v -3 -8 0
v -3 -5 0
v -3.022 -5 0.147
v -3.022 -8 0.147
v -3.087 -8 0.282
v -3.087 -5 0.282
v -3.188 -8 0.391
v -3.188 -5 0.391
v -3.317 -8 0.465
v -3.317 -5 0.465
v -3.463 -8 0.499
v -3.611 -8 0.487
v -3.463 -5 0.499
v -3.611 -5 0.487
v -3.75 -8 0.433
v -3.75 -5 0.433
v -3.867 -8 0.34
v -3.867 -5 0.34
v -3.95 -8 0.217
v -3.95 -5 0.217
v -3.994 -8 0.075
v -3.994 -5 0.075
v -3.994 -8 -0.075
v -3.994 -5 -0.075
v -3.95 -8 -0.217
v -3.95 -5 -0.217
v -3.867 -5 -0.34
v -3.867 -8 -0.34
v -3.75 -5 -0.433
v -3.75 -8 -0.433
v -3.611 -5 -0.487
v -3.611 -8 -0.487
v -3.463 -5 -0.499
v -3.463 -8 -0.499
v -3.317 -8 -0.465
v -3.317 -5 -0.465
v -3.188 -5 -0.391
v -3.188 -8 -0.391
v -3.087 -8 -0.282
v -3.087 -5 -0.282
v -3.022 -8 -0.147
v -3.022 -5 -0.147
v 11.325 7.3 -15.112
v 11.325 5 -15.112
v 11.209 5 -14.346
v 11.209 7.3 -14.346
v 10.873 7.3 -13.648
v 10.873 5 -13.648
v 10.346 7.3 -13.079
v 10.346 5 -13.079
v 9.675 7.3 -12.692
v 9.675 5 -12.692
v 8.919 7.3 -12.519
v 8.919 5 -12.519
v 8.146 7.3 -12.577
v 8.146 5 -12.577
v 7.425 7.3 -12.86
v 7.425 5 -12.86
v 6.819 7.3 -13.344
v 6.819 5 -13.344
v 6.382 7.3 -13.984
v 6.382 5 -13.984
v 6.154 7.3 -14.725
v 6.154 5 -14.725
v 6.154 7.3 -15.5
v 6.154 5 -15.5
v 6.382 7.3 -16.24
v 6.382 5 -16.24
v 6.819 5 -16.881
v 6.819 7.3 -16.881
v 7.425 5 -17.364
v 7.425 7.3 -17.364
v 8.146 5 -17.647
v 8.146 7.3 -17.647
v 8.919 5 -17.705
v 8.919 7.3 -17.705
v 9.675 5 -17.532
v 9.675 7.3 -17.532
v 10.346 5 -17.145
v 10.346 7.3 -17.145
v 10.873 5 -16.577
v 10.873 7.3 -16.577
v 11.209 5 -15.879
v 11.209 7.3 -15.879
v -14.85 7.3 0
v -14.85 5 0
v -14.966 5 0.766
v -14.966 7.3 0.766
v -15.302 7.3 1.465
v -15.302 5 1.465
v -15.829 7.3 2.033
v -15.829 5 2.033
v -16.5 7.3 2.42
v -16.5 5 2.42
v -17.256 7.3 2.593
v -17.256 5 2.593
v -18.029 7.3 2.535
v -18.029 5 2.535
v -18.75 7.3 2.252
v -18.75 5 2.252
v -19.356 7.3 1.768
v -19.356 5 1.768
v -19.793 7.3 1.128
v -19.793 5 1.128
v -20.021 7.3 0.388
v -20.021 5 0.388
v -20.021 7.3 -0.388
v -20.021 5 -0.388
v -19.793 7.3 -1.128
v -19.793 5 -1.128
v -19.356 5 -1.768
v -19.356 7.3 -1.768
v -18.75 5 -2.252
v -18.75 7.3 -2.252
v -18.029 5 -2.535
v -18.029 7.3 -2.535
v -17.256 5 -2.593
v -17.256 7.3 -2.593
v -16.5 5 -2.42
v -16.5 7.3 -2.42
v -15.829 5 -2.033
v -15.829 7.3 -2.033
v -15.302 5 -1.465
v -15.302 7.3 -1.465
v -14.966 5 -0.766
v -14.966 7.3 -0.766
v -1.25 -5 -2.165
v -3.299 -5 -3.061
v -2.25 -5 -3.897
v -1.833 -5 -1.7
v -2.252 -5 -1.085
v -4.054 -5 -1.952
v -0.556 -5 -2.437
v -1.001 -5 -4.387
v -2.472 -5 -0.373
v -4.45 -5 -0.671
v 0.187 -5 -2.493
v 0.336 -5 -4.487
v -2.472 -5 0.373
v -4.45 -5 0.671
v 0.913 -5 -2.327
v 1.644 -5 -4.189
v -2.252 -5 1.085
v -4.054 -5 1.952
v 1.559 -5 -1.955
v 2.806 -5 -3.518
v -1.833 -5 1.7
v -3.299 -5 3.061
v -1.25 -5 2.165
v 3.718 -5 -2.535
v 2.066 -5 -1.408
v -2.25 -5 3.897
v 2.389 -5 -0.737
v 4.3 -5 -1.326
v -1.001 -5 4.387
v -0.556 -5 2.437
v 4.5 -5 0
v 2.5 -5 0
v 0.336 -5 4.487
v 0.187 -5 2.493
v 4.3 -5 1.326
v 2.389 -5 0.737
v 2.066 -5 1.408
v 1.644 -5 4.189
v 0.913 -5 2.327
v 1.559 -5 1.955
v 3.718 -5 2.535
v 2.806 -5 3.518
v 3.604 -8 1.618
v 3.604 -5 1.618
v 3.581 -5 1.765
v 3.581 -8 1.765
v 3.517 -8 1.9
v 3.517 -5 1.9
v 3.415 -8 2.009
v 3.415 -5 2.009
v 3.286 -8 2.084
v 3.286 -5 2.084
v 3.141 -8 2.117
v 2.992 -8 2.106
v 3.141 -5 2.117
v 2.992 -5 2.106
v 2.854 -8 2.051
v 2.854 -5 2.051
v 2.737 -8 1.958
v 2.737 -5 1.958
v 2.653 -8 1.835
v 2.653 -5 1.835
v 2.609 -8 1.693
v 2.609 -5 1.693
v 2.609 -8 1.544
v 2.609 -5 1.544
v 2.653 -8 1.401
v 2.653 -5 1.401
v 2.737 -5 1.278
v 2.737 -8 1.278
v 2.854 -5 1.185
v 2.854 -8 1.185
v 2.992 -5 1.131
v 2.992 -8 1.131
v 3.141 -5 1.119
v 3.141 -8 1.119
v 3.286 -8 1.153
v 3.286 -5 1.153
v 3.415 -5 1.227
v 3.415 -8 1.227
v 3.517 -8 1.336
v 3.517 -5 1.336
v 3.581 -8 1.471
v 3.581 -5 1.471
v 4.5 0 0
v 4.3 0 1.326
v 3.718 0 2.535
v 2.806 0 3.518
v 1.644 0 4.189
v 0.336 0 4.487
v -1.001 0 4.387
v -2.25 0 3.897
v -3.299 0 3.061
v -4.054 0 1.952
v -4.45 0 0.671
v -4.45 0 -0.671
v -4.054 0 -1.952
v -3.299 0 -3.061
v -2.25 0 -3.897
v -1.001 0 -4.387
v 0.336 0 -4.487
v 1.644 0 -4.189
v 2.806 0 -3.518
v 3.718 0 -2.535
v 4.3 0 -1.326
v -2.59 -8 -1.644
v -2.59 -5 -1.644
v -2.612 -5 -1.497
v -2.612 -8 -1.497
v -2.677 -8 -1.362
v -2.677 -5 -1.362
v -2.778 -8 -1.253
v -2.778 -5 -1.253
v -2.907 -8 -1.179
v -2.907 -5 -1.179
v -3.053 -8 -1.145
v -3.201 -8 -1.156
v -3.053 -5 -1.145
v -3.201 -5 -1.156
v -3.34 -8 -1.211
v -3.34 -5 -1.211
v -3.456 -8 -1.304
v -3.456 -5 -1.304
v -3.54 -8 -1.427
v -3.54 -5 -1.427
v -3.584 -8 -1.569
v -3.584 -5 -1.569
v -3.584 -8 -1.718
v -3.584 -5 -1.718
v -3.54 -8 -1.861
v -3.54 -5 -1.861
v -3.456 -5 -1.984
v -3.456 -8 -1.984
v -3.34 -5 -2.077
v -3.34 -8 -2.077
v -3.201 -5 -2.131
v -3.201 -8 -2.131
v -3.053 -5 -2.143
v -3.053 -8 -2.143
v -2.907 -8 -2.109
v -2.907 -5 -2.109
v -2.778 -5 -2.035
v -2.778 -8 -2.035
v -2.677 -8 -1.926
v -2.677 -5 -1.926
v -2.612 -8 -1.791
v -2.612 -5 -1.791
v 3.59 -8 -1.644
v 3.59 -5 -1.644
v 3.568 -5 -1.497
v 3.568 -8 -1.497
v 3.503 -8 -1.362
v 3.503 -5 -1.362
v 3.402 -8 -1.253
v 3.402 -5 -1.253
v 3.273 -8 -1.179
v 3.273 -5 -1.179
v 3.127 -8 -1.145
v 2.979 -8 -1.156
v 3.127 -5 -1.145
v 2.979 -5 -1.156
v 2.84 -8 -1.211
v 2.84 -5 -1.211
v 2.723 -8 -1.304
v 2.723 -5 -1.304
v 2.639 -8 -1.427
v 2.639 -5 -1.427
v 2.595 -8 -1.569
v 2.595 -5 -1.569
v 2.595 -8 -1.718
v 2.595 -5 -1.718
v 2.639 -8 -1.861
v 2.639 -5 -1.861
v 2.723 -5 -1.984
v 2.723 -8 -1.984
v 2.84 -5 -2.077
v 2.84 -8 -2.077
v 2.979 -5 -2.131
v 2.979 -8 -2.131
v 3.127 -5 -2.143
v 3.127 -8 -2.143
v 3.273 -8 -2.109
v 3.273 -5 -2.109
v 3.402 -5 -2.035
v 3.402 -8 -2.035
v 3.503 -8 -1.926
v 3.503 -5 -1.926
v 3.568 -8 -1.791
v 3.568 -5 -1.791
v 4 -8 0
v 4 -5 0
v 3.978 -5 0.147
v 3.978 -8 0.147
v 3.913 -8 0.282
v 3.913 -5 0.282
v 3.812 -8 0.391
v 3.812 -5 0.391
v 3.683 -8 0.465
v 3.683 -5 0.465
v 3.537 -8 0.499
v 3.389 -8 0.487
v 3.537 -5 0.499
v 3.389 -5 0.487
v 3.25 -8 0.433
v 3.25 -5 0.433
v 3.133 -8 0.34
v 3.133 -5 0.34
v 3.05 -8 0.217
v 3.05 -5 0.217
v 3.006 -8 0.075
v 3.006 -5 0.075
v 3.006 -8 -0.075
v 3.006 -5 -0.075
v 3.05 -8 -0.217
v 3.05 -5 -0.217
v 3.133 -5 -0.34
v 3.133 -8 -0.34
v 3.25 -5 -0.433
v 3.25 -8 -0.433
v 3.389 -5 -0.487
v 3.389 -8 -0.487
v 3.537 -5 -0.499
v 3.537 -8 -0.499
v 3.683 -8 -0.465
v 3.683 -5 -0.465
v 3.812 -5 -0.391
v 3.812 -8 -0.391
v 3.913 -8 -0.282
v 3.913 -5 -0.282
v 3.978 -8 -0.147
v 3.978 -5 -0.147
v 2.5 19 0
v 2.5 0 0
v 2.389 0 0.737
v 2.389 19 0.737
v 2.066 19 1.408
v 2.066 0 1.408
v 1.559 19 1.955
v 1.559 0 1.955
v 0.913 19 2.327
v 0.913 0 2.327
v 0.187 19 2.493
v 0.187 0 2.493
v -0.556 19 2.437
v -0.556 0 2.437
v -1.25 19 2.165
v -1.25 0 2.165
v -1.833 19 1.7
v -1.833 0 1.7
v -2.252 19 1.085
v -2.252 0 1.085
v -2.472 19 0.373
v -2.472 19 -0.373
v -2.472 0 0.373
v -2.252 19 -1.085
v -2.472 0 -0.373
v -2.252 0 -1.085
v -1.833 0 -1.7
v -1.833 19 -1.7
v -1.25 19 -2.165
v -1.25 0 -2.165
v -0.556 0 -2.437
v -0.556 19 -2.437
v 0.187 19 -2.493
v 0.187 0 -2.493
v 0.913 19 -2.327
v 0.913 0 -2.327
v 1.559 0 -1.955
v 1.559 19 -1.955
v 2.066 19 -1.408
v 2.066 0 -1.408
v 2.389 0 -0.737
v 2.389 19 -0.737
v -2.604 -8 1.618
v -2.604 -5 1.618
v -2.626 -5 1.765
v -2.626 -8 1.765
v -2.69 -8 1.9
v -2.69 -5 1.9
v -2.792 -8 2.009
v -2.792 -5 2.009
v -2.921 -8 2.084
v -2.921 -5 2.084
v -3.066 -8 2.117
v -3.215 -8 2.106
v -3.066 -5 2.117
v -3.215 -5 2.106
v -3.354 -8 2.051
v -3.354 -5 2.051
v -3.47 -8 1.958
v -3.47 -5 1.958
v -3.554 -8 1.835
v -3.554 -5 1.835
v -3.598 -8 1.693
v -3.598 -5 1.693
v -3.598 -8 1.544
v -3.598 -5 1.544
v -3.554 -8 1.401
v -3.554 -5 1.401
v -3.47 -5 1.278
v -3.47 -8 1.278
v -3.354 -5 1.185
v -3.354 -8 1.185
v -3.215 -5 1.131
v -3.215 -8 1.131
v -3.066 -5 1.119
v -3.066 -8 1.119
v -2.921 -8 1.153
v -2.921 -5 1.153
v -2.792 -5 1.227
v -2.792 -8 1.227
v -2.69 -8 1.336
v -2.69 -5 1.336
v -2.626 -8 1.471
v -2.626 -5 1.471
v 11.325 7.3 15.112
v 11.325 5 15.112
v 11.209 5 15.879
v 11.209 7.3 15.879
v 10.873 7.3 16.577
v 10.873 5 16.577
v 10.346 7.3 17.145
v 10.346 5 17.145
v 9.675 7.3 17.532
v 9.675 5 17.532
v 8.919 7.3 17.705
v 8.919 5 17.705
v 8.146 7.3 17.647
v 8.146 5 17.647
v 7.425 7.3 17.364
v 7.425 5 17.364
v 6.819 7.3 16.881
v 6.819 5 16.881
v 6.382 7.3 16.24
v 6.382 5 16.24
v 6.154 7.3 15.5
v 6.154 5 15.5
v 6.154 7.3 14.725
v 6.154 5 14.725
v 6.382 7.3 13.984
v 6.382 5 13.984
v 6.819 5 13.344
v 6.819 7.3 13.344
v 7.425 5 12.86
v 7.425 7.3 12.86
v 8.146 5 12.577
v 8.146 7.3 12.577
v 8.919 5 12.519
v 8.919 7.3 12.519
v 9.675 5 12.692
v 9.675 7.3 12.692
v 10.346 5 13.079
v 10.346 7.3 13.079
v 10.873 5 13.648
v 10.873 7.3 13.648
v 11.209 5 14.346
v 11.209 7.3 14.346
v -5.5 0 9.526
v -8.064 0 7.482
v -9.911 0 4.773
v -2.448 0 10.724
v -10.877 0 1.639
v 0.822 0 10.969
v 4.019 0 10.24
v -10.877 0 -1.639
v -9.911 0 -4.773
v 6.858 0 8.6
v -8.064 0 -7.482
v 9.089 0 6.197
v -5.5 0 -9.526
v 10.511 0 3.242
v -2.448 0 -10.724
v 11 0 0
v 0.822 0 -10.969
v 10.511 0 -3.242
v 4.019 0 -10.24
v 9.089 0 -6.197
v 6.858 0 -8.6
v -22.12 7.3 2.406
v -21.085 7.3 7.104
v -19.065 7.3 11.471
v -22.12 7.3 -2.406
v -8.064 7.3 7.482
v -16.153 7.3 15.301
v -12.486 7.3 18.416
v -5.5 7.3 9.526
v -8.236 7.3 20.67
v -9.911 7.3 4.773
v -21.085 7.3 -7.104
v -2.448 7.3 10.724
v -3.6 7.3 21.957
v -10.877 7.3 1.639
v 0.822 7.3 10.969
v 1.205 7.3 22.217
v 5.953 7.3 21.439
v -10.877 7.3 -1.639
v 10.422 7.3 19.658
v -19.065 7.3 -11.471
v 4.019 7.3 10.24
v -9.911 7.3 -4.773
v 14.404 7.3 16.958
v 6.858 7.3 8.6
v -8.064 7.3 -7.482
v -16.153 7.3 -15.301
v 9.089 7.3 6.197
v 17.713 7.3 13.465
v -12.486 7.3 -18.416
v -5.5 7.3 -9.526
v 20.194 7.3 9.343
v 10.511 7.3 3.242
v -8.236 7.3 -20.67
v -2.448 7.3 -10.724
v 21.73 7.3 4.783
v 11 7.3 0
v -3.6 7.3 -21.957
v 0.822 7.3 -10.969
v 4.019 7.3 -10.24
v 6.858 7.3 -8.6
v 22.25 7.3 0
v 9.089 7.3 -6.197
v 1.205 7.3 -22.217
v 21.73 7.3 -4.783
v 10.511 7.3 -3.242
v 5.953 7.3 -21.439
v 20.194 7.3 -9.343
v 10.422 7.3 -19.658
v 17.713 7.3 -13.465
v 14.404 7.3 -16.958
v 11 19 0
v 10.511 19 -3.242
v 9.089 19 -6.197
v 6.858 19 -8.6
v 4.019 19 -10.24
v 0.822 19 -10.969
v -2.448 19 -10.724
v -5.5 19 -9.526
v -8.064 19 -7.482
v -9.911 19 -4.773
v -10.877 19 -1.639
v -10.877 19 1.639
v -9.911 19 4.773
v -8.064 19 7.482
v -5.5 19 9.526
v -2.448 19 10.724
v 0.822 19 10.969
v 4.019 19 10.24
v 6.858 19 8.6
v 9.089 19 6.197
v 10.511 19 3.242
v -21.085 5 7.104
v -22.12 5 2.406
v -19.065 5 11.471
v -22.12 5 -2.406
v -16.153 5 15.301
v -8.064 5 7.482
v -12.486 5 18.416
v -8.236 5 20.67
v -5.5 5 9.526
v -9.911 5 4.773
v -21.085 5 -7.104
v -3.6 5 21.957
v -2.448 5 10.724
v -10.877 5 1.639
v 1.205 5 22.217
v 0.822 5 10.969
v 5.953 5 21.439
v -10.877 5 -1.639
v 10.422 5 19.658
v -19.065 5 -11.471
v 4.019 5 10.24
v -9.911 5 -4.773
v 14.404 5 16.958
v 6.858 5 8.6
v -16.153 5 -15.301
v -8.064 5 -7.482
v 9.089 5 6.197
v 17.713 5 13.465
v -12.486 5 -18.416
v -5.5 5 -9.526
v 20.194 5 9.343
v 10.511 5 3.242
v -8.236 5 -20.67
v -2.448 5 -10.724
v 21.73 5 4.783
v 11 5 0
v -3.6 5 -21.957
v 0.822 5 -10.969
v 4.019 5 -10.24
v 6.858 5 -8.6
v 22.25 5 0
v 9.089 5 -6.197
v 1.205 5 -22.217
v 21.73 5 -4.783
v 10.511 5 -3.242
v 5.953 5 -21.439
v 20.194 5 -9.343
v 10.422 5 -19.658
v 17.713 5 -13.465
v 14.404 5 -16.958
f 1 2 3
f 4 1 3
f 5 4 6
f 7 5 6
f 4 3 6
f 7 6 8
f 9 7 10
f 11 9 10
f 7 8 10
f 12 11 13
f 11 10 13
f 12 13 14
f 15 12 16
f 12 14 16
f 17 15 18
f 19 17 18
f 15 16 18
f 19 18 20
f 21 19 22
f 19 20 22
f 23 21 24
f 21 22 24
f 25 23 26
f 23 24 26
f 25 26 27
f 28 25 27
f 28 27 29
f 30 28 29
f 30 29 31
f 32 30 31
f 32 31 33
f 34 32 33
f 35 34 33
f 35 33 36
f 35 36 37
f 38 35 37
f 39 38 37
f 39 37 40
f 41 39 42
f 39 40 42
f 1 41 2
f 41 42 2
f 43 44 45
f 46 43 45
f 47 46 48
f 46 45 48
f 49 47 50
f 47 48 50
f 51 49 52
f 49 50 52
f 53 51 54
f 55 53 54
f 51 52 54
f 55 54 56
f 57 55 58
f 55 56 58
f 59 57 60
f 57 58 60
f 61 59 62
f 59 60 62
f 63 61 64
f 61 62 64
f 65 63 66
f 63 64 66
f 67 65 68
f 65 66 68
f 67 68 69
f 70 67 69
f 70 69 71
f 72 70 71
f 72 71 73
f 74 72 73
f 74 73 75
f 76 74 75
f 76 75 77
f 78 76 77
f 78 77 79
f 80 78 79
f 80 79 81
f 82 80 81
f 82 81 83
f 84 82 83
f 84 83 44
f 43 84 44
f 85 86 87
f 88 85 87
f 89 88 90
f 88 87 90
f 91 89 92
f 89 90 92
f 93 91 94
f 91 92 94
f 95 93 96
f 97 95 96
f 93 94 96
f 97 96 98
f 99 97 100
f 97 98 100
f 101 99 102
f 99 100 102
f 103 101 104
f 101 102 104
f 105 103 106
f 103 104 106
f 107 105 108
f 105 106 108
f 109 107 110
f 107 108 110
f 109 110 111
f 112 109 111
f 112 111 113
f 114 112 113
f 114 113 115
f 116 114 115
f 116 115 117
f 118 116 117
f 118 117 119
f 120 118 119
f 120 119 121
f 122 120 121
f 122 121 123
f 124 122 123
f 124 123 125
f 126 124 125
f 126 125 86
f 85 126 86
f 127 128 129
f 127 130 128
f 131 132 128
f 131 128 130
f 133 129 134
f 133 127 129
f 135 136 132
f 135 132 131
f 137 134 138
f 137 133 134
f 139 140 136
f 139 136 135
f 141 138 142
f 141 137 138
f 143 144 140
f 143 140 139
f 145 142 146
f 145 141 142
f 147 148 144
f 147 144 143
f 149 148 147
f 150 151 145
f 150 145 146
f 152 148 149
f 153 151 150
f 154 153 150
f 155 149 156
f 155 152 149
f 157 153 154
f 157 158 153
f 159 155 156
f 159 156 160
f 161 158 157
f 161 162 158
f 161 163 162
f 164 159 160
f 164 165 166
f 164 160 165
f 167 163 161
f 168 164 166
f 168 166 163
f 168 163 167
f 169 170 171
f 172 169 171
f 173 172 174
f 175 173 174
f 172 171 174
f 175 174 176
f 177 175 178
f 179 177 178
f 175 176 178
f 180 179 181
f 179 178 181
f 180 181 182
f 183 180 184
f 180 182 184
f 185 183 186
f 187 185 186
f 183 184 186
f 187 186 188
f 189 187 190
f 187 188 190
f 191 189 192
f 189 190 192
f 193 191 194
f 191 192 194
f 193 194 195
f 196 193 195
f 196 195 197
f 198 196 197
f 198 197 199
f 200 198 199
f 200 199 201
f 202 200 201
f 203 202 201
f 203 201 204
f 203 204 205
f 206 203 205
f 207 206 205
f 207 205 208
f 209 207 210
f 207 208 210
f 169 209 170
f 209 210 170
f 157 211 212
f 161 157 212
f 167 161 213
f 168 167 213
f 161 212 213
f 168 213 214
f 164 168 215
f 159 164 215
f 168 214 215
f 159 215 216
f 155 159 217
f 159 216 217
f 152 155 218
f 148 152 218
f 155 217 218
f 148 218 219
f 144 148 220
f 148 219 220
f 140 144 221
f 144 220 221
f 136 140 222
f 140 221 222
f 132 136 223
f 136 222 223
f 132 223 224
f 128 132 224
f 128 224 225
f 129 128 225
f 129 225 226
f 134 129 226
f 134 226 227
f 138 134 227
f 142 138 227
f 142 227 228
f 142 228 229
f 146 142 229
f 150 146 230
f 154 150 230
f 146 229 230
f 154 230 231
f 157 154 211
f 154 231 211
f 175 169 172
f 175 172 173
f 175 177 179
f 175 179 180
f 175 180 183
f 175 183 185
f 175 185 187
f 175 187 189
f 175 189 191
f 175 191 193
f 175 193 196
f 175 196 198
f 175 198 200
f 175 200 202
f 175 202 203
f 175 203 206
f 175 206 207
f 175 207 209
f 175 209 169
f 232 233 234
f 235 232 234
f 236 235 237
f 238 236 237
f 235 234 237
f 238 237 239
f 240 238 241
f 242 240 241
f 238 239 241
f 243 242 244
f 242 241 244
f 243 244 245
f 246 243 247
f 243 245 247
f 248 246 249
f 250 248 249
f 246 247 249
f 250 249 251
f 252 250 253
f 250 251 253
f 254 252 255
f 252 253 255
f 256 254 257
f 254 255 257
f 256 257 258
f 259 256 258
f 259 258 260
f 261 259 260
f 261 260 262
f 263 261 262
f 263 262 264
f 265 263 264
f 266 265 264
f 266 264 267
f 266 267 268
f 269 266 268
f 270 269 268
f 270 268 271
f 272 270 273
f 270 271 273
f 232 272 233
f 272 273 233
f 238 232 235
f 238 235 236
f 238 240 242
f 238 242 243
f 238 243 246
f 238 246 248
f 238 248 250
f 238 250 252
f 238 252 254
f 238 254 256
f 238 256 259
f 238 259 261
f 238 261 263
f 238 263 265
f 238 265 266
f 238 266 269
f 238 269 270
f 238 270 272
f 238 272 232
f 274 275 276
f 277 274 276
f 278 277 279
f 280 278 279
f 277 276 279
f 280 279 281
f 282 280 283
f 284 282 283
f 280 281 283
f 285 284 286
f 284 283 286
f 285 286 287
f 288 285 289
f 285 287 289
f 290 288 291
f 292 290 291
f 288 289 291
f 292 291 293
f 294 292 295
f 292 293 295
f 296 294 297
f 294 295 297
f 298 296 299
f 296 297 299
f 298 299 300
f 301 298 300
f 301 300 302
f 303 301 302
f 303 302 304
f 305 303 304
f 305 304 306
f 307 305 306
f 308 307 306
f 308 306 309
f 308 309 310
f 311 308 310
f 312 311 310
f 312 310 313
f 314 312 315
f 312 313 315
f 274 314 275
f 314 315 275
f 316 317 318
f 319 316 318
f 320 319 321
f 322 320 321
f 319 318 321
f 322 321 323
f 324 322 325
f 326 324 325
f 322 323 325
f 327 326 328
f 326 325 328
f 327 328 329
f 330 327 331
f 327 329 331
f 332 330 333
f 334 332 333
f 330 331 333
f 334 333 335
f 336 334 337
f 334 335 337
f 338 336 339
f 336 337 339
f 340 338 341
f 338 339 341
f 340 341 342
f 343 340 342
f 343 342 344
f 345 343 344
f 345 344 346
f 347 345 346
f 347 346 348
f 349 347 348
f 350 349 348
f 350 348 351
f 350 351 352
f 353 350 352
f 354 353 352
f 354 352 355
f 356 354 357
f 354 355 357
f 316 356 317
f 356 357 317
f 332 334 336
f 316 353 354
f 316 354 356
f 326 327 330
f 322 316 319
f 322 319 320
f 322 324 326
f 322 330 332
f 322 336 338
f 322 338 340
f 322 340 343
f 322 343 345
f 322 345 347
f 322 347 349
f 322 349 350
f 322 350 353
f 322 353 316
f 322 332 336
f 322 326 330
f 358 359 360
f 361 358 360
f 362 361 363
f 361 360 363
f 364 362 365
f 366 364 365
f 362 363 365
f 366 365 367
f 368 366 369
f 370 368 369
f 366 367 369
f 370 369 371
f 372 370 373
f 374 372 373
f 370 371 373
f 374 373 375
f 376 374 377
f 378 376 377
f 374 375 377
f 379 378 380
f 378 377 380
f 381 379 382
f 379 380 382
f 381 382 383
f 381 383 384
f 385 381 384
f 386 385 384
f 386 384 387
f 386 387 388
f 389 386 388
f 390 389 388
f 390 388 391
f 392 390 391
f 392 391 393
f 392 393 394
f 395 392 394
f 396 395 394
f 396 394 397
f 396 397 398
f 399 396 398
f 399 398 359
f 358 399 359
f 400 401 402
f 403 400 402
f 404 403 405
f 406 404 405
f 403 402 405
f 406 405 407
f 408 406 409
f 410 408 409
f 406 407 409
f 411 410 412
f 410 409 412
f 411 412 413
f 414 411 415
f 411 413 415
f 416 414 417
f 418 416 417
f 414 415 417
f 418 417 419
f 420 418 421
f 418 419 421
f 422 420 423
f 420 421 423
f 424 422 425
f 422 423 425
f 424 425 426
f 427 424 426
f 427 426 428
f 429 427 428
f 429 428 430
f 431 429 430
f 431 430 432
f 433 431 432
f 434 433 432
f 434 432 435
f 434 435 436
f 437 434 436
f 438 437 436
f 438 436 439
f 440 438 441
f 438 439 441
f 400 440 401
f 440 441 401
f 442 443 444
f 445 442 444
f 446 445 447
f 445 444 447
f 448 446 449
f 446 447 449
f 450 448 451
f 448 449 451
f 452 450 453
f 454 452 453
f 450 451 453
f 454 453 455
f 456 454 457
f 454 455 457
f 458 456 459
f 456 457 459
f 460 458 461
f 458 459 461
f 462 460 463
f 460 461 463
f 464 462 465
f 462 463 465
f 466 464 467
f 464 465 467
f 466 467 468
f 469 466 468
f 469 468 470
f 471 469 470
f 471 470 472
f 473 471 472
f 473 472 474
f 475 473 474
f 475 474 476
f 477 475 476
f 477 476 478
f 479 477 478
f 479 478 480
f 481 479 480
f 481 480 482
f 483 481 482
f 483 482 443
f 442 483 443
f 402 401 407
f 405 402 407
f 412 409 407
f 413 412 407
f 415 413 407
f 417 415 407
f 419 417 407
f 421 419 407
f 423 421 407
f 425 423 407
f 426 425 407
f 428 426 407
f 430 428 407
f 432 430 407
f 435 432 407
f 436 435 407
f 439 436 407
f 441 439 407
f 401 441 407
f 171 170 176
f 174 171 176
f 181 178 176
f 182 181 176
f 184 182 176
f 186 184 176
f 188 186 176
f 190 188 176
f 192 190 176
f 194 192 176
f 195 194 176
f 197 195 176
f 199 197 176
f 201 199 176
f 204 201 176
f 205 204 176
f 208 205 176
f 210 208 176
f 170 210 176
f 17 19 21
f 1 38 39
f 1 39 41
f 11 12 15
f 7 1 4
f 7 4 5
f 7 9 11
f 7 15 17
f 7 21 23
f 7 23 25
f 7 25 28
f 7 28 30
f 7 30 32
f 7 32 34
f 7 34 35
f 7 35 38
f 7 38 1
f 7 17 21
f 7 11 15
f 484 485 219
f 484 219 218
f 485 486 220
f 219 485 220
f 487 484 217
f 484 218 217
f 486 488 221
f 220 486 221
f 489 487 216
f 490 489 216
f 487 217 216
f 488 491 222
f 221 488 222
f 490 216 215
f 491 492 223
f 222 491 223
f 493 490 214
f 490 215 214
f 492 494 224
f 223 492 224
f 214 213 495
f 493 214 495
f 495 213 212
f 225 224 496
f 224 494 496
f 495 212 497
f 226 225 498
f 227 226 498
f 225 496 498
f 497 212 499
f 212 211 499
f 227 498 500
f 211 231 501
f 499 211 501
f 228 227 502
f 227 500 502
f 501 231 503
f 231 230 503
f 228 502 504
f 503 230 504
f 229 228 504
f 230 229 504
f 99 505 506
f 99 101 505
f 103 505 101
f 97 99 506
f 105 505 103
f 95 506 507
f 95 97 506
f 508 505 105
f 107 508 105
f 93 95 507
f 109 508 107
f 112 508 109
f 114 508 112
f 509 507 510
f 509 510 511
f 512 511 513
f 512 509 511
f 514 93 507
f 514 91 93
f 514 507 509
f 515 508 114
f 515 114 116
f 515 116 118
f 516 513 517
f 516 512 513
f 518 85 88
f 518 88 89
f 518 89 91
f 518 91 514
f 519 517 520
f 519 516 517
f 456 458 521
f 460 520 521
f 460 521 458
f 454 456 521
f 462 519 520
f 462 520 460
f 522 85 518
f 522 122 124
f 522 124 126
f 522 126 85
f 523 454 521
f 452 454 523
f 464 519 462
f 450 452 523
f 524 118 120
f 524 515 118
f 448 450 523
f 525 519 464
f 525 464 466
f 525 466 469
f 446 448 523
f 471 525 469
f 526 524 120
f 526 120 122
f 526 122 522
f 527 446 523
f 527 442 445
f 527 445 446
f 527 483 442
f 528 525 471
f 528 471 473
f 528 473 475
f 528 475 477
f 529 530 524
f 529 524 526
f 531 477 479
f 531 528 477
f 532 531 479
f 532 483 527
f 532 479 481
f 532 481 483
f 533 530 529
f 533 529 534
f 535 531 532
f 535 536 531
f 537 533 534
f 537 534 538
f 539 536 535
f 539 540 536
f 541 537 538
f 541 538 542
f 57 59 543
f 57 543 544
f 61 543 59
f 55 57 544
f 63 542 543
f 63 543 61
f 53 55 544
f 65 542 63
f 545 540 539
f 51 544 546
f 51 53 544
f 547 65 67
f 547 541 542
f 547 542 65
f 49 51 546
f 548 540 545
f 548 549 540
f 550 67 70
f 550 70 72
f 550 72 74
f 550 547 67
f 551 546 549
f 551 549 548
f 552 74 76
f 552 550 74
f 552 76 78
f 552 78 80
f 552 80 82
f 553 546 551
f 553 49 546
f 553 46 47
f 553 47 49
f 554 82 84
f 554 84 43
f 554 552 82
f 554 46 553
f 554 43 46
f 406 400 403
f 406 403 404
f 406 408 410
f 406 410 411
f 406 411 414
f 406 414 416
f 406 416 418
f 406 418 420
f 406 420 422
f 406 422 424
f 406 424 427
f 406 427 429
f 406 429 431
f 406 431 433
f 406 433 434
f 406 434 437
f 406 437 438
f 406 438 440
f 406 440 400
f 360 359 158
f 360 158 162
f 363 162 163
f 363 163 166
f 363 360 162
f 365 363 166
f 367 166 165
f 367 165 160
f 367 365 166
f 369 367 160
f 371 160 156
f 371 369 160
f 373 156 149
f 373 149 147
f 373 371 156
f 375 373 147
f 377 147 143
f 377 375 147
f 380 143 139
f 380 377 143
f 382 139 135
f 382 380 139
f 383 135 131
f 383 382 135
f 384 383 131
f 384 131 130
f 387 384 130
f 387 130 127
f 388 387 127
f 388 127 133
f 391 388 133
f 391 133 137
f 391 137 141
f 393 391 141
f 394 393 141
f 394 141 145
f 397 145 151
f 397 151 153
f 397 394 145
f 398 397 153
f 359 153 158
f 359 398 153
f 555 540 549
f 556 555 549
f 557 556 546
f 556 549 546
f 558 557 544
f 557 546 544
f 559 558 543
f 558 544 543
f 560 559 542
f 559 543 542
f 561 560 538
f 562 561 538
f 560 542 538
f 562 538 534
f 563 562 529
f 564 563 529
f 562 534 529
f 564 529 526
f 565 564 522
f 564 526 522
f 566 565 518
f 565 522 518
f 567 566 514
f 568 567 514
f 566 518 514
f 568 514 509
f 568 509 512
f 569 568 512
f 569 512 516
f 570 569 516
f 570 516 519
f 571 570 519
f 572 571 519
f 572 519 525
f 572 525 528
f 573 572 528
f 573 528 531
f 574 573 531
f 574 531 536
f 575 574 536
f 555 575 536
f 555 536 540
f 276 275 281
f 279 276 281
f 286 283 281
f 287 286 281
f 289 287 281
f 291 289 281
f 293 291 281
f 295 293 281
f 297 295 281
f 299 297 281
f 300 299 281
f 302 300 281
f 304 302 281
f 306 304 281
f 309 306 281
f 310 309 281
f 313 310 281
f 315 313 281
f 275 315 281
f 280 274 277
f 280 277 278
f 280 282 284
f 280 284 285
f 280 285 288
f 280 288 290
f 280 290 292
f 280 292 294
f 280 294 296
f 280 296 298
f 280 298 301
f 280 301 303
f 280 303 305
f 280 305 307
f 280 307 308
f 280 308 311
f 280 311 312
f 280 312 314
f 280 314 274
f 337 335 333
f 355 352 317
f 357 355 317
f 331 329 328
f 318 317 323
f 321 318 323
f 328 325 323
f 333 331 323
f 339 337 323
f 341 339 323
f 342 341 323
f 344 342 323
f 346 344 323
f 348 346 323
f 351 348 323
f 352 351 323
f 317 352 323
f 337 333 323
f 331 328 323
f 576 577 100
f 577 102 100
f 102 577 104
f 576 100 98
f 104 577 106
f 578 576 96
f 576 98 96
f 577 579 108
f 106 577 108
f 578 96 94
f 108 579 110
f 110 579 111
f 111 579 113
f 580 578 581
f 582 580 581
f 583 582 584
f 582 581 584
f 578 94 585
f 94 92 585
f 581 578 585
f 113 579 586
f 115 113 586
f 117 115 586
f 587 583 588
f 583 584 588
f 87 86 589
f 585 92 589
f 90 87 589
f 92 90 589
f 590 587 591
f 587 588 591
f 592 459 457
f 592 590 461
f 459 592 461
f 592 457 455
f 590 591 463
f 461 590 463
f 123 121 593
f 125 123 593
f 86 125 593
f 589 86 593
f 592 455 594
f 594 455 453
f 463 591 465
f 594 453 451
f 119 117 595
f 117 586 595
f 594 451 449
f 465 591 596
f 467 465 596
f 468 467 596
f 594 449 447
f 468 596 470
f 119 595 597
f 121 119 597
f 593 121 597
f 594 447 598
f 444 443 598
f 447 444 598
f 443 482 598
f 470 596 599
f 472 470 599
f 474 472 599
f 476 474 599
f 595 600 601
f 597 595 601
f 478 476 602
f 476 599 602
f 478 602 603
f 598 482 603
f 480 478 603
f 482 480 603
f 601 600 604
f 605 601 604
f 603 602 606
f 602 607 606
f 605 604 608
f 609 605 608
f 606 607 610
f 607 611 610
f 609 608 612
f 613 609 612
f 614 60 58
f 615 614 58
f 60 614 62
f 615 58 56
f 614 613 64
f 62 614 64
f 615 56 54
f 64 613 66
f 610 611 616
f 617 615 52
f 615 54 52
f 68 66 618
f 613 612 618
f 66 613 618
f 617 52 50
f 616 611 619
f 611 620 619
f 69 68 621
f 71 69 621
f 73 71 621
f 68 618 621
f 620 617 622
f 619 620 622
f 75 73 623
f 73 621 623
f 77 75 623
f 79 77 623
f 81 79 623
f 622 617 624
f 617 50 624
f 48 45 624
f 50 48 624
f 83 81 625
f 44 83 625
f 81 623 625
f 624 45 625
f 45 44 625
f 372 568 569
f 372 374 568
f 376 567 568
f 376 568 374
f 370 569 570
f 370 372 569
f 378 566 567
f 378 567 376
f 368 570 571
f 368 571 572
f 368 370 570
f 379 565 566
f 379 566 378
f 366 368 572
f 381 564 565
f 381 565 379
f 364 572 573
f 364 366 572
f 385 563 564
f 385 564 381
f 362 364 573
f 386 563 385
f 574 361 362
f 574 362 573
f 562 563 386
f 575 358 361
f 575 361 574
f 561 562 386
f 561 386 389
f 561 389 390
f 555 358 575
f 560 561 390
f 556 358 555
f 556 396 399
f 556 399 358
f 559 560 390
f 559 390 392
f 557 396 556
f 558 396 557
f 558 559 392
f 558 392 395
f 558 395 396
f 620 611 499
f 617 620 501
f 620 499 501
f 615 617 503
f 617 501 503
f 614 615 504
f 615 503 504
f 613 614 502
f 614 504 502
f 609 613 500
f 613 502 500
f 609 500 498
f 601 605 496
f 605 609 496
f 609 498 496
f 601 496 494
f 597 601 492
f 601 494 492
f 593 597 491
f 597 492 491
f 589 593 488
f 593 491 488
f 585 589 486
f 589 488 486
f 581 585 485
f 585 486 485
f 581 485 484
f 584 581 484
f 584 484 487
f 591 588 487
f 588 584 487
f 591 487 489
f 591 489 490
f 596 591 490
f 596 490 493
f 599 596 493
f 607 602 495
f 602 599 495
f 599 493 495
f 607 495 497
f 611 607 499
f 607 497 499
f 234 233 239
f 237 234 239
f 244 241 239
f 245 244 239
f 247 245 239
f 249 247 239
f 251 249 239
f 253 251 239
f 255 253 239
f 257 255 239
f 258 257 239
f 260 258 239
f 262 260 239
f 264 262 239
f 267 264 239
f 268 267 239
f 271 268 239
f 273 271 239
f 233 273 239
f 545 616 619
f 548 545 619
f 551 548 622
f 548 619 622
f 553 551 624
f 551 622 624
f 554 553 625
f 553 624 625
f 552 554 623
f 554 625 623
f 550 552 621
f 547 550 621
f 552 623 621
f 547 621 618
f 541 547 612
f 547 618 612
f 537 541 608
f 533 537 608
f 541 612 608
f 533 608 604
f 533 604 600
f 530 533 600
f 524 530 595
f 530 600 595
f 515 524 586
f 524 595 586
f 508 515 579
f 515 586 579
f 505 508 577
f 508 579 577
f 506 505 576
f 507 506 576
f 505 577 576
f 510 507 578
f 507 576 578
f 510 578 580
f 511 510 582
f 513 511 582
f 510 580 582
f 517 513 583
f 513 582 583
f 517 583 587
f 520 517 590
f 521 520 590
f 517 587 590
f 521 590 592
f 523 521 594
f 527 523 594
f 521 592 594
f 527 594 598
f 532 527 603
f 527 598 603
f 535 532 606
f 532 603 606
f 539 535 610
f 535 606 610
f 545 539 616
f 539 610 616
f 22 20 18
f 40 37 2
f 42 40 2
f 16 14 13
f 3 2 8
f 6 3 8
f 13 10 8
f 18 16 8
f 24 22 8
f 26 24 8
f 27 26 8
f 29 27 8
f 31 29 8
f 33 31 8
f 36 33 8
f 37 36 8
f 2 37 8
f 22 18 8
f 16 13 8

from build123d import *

# Parameters (mm, degrees)
SKETCH1_R             = 11
BOSS_EXTRUDE1_DEPTH   = 19
SKETCH2_R             = 22.25
BOSS_EXTRUDE2_DEPTH   = 2.3
SKETCH4_R             = 2.5
CUT_EXTRUDE1_DEPTH    = 20
SKETCH5_R             = 2.6
CUT_EXTRUDE2_DEPTH    = 15
SKETCH6_R             = 4.5
SKETCH6_R_2           = 2.5
BOSS_EXTRUDE3_DEPTH   = 5
SKETCH7_R             = 0.5
BOSS_EXTRUDE4_DEPTH   = 3
BOSS_EXTRUDE4_2_DEPTH = 3
BOSS_EXTRUDE4_3_DEPTH = 3
BOSS_EXTRUDE4_4_DEPTH = 3
BOSS_EXTRUDE4_5_DEPTH = 3
BOSS_EXTRUDE4_6_DEPTH = 3


with BuildPart() as part:
    # Sketch1 → Boss-Extrude1 (new body)
    with BuildSketch(Plane(origin=(0, 0, 0), x_dir=(1, 0, 0), z_dir=(0, 1, 0))):
        Circle(SKETCH1_R)
    extrude(amount=BOSS_EXTRUDE1_DEPTH)

    # Sketch2 → Boss-Extrude2 (add)
    with BuildSketch(Plane(origin=(0, 5, 0), x_dir=(1, 0, 0), z_dir=(0, 1, 0))):
        Circle(SKETCH2_R)
    extrude(amount=BOSS_EXTRUDE2_DEPTH)

    # Sketch4 → Cut-Extrude1 (cut, through all)
    with BuildSketch(Plane.XZ):
        Circle(SKETCH4_R)
    extrude(amount=-CUT_EXTRUDE1_DEPTH, mode=Mode.SUBTRACT)

    # Sketch5 → Cut-Extrude2 (cut, through all)
    with BuildSketch(Plane.XZ.offset(-5)):
        with Locations((-17.45, 0)):
            Circle(SKETCH5_R)
        with Locations((8.725, 15.112143296)):
            Circle(SKETCH5_R)
        with Locations((8.725, -15.112143296)):
            Circle(SKETCH5_R)
    extrude(amount=-CUT_EXTRUDE2_DEPTH, mode=Mode.SUBTRACT)

    # Sketch6 → Boss-Extrude3 (add)
    with BuildSketch(Plane.XZ):
        Circle(SKETCH6_R)
        Circle(SKETCH6_R_2, mode=Mode.SUBTRACT)
    extrude(amount=BOSS_EXTRUDE3_DEPTH)


with BuildPart() as body_2:
    # Sketch7 → Boss-Extrude4 (new body)
    with BuildSketch(Plane.XZ.offset(5)):
        with Locations((3.103518322, 1.618077263)):
            Circle(SKETCH7_R)
    extrude(amount=BOSS_EXTRUDE4_DEPTH)


with BuildPart() as body_3:
    # Sketch7 → Boss-Extrude4 2 (new body)
    with BuildSketch(Plane.XZ.offset(5)):
        with Locations((3.5, 0)):
            Circle(SKETCH7_R)
    extrude(amount=BOSS_EXTRUDE4_2_DEPTH)


with BuildPart() as body_4:
    # Sketch7 → Boss-Extrude4 3 (new body)
    with BuildSketch(Plane.XZ.offset(5)):
        with Locations((3.089895924, -1.643941355)):
            Circle(SKETCH7_R)
    extrude(amount=BOSS_EXTRUDE4_3_DEPTH)


with BuildPart() as body_5:
    # Sketch7 → Boss-Extrude4 4 (new body)
    with BuildSketch(Plane.XZ.offset(5)):
        with Locations((-3.089895924, -1.643941355)):
            Circle(SKETCH7_R)
    extrude(amount=BOSS_EXTRUDE4_4_DEPTH)


with BuildPart() as body_6:
    # Sketch7 → Boss-Extrude4 5 (new body)
    with BuildSketch(Plane.XZ.offset(5)):
        with Locations((-3.5, 0)):
            Circle(SKETCH7_R)
    extrude(amount=BOSS_EXTRUDE4_5_DEPTH)


with BuildPart() as body_7:
    # Sketch7 → Boss-Extrude4 6 (new body)
    with BuildSketch(Plane.XZ.offset(5)):
        with Locations((-3.103518322, 1.618077263)):
            Circle(SKETCH7_R)
    extrude(amount=BOSS_EXTRUDE4_6_DEPTH)


solid = Compound([part.part, body_2.part, body_3.part, body_4.part, body_5.part, body_6.part, body_7.part])
